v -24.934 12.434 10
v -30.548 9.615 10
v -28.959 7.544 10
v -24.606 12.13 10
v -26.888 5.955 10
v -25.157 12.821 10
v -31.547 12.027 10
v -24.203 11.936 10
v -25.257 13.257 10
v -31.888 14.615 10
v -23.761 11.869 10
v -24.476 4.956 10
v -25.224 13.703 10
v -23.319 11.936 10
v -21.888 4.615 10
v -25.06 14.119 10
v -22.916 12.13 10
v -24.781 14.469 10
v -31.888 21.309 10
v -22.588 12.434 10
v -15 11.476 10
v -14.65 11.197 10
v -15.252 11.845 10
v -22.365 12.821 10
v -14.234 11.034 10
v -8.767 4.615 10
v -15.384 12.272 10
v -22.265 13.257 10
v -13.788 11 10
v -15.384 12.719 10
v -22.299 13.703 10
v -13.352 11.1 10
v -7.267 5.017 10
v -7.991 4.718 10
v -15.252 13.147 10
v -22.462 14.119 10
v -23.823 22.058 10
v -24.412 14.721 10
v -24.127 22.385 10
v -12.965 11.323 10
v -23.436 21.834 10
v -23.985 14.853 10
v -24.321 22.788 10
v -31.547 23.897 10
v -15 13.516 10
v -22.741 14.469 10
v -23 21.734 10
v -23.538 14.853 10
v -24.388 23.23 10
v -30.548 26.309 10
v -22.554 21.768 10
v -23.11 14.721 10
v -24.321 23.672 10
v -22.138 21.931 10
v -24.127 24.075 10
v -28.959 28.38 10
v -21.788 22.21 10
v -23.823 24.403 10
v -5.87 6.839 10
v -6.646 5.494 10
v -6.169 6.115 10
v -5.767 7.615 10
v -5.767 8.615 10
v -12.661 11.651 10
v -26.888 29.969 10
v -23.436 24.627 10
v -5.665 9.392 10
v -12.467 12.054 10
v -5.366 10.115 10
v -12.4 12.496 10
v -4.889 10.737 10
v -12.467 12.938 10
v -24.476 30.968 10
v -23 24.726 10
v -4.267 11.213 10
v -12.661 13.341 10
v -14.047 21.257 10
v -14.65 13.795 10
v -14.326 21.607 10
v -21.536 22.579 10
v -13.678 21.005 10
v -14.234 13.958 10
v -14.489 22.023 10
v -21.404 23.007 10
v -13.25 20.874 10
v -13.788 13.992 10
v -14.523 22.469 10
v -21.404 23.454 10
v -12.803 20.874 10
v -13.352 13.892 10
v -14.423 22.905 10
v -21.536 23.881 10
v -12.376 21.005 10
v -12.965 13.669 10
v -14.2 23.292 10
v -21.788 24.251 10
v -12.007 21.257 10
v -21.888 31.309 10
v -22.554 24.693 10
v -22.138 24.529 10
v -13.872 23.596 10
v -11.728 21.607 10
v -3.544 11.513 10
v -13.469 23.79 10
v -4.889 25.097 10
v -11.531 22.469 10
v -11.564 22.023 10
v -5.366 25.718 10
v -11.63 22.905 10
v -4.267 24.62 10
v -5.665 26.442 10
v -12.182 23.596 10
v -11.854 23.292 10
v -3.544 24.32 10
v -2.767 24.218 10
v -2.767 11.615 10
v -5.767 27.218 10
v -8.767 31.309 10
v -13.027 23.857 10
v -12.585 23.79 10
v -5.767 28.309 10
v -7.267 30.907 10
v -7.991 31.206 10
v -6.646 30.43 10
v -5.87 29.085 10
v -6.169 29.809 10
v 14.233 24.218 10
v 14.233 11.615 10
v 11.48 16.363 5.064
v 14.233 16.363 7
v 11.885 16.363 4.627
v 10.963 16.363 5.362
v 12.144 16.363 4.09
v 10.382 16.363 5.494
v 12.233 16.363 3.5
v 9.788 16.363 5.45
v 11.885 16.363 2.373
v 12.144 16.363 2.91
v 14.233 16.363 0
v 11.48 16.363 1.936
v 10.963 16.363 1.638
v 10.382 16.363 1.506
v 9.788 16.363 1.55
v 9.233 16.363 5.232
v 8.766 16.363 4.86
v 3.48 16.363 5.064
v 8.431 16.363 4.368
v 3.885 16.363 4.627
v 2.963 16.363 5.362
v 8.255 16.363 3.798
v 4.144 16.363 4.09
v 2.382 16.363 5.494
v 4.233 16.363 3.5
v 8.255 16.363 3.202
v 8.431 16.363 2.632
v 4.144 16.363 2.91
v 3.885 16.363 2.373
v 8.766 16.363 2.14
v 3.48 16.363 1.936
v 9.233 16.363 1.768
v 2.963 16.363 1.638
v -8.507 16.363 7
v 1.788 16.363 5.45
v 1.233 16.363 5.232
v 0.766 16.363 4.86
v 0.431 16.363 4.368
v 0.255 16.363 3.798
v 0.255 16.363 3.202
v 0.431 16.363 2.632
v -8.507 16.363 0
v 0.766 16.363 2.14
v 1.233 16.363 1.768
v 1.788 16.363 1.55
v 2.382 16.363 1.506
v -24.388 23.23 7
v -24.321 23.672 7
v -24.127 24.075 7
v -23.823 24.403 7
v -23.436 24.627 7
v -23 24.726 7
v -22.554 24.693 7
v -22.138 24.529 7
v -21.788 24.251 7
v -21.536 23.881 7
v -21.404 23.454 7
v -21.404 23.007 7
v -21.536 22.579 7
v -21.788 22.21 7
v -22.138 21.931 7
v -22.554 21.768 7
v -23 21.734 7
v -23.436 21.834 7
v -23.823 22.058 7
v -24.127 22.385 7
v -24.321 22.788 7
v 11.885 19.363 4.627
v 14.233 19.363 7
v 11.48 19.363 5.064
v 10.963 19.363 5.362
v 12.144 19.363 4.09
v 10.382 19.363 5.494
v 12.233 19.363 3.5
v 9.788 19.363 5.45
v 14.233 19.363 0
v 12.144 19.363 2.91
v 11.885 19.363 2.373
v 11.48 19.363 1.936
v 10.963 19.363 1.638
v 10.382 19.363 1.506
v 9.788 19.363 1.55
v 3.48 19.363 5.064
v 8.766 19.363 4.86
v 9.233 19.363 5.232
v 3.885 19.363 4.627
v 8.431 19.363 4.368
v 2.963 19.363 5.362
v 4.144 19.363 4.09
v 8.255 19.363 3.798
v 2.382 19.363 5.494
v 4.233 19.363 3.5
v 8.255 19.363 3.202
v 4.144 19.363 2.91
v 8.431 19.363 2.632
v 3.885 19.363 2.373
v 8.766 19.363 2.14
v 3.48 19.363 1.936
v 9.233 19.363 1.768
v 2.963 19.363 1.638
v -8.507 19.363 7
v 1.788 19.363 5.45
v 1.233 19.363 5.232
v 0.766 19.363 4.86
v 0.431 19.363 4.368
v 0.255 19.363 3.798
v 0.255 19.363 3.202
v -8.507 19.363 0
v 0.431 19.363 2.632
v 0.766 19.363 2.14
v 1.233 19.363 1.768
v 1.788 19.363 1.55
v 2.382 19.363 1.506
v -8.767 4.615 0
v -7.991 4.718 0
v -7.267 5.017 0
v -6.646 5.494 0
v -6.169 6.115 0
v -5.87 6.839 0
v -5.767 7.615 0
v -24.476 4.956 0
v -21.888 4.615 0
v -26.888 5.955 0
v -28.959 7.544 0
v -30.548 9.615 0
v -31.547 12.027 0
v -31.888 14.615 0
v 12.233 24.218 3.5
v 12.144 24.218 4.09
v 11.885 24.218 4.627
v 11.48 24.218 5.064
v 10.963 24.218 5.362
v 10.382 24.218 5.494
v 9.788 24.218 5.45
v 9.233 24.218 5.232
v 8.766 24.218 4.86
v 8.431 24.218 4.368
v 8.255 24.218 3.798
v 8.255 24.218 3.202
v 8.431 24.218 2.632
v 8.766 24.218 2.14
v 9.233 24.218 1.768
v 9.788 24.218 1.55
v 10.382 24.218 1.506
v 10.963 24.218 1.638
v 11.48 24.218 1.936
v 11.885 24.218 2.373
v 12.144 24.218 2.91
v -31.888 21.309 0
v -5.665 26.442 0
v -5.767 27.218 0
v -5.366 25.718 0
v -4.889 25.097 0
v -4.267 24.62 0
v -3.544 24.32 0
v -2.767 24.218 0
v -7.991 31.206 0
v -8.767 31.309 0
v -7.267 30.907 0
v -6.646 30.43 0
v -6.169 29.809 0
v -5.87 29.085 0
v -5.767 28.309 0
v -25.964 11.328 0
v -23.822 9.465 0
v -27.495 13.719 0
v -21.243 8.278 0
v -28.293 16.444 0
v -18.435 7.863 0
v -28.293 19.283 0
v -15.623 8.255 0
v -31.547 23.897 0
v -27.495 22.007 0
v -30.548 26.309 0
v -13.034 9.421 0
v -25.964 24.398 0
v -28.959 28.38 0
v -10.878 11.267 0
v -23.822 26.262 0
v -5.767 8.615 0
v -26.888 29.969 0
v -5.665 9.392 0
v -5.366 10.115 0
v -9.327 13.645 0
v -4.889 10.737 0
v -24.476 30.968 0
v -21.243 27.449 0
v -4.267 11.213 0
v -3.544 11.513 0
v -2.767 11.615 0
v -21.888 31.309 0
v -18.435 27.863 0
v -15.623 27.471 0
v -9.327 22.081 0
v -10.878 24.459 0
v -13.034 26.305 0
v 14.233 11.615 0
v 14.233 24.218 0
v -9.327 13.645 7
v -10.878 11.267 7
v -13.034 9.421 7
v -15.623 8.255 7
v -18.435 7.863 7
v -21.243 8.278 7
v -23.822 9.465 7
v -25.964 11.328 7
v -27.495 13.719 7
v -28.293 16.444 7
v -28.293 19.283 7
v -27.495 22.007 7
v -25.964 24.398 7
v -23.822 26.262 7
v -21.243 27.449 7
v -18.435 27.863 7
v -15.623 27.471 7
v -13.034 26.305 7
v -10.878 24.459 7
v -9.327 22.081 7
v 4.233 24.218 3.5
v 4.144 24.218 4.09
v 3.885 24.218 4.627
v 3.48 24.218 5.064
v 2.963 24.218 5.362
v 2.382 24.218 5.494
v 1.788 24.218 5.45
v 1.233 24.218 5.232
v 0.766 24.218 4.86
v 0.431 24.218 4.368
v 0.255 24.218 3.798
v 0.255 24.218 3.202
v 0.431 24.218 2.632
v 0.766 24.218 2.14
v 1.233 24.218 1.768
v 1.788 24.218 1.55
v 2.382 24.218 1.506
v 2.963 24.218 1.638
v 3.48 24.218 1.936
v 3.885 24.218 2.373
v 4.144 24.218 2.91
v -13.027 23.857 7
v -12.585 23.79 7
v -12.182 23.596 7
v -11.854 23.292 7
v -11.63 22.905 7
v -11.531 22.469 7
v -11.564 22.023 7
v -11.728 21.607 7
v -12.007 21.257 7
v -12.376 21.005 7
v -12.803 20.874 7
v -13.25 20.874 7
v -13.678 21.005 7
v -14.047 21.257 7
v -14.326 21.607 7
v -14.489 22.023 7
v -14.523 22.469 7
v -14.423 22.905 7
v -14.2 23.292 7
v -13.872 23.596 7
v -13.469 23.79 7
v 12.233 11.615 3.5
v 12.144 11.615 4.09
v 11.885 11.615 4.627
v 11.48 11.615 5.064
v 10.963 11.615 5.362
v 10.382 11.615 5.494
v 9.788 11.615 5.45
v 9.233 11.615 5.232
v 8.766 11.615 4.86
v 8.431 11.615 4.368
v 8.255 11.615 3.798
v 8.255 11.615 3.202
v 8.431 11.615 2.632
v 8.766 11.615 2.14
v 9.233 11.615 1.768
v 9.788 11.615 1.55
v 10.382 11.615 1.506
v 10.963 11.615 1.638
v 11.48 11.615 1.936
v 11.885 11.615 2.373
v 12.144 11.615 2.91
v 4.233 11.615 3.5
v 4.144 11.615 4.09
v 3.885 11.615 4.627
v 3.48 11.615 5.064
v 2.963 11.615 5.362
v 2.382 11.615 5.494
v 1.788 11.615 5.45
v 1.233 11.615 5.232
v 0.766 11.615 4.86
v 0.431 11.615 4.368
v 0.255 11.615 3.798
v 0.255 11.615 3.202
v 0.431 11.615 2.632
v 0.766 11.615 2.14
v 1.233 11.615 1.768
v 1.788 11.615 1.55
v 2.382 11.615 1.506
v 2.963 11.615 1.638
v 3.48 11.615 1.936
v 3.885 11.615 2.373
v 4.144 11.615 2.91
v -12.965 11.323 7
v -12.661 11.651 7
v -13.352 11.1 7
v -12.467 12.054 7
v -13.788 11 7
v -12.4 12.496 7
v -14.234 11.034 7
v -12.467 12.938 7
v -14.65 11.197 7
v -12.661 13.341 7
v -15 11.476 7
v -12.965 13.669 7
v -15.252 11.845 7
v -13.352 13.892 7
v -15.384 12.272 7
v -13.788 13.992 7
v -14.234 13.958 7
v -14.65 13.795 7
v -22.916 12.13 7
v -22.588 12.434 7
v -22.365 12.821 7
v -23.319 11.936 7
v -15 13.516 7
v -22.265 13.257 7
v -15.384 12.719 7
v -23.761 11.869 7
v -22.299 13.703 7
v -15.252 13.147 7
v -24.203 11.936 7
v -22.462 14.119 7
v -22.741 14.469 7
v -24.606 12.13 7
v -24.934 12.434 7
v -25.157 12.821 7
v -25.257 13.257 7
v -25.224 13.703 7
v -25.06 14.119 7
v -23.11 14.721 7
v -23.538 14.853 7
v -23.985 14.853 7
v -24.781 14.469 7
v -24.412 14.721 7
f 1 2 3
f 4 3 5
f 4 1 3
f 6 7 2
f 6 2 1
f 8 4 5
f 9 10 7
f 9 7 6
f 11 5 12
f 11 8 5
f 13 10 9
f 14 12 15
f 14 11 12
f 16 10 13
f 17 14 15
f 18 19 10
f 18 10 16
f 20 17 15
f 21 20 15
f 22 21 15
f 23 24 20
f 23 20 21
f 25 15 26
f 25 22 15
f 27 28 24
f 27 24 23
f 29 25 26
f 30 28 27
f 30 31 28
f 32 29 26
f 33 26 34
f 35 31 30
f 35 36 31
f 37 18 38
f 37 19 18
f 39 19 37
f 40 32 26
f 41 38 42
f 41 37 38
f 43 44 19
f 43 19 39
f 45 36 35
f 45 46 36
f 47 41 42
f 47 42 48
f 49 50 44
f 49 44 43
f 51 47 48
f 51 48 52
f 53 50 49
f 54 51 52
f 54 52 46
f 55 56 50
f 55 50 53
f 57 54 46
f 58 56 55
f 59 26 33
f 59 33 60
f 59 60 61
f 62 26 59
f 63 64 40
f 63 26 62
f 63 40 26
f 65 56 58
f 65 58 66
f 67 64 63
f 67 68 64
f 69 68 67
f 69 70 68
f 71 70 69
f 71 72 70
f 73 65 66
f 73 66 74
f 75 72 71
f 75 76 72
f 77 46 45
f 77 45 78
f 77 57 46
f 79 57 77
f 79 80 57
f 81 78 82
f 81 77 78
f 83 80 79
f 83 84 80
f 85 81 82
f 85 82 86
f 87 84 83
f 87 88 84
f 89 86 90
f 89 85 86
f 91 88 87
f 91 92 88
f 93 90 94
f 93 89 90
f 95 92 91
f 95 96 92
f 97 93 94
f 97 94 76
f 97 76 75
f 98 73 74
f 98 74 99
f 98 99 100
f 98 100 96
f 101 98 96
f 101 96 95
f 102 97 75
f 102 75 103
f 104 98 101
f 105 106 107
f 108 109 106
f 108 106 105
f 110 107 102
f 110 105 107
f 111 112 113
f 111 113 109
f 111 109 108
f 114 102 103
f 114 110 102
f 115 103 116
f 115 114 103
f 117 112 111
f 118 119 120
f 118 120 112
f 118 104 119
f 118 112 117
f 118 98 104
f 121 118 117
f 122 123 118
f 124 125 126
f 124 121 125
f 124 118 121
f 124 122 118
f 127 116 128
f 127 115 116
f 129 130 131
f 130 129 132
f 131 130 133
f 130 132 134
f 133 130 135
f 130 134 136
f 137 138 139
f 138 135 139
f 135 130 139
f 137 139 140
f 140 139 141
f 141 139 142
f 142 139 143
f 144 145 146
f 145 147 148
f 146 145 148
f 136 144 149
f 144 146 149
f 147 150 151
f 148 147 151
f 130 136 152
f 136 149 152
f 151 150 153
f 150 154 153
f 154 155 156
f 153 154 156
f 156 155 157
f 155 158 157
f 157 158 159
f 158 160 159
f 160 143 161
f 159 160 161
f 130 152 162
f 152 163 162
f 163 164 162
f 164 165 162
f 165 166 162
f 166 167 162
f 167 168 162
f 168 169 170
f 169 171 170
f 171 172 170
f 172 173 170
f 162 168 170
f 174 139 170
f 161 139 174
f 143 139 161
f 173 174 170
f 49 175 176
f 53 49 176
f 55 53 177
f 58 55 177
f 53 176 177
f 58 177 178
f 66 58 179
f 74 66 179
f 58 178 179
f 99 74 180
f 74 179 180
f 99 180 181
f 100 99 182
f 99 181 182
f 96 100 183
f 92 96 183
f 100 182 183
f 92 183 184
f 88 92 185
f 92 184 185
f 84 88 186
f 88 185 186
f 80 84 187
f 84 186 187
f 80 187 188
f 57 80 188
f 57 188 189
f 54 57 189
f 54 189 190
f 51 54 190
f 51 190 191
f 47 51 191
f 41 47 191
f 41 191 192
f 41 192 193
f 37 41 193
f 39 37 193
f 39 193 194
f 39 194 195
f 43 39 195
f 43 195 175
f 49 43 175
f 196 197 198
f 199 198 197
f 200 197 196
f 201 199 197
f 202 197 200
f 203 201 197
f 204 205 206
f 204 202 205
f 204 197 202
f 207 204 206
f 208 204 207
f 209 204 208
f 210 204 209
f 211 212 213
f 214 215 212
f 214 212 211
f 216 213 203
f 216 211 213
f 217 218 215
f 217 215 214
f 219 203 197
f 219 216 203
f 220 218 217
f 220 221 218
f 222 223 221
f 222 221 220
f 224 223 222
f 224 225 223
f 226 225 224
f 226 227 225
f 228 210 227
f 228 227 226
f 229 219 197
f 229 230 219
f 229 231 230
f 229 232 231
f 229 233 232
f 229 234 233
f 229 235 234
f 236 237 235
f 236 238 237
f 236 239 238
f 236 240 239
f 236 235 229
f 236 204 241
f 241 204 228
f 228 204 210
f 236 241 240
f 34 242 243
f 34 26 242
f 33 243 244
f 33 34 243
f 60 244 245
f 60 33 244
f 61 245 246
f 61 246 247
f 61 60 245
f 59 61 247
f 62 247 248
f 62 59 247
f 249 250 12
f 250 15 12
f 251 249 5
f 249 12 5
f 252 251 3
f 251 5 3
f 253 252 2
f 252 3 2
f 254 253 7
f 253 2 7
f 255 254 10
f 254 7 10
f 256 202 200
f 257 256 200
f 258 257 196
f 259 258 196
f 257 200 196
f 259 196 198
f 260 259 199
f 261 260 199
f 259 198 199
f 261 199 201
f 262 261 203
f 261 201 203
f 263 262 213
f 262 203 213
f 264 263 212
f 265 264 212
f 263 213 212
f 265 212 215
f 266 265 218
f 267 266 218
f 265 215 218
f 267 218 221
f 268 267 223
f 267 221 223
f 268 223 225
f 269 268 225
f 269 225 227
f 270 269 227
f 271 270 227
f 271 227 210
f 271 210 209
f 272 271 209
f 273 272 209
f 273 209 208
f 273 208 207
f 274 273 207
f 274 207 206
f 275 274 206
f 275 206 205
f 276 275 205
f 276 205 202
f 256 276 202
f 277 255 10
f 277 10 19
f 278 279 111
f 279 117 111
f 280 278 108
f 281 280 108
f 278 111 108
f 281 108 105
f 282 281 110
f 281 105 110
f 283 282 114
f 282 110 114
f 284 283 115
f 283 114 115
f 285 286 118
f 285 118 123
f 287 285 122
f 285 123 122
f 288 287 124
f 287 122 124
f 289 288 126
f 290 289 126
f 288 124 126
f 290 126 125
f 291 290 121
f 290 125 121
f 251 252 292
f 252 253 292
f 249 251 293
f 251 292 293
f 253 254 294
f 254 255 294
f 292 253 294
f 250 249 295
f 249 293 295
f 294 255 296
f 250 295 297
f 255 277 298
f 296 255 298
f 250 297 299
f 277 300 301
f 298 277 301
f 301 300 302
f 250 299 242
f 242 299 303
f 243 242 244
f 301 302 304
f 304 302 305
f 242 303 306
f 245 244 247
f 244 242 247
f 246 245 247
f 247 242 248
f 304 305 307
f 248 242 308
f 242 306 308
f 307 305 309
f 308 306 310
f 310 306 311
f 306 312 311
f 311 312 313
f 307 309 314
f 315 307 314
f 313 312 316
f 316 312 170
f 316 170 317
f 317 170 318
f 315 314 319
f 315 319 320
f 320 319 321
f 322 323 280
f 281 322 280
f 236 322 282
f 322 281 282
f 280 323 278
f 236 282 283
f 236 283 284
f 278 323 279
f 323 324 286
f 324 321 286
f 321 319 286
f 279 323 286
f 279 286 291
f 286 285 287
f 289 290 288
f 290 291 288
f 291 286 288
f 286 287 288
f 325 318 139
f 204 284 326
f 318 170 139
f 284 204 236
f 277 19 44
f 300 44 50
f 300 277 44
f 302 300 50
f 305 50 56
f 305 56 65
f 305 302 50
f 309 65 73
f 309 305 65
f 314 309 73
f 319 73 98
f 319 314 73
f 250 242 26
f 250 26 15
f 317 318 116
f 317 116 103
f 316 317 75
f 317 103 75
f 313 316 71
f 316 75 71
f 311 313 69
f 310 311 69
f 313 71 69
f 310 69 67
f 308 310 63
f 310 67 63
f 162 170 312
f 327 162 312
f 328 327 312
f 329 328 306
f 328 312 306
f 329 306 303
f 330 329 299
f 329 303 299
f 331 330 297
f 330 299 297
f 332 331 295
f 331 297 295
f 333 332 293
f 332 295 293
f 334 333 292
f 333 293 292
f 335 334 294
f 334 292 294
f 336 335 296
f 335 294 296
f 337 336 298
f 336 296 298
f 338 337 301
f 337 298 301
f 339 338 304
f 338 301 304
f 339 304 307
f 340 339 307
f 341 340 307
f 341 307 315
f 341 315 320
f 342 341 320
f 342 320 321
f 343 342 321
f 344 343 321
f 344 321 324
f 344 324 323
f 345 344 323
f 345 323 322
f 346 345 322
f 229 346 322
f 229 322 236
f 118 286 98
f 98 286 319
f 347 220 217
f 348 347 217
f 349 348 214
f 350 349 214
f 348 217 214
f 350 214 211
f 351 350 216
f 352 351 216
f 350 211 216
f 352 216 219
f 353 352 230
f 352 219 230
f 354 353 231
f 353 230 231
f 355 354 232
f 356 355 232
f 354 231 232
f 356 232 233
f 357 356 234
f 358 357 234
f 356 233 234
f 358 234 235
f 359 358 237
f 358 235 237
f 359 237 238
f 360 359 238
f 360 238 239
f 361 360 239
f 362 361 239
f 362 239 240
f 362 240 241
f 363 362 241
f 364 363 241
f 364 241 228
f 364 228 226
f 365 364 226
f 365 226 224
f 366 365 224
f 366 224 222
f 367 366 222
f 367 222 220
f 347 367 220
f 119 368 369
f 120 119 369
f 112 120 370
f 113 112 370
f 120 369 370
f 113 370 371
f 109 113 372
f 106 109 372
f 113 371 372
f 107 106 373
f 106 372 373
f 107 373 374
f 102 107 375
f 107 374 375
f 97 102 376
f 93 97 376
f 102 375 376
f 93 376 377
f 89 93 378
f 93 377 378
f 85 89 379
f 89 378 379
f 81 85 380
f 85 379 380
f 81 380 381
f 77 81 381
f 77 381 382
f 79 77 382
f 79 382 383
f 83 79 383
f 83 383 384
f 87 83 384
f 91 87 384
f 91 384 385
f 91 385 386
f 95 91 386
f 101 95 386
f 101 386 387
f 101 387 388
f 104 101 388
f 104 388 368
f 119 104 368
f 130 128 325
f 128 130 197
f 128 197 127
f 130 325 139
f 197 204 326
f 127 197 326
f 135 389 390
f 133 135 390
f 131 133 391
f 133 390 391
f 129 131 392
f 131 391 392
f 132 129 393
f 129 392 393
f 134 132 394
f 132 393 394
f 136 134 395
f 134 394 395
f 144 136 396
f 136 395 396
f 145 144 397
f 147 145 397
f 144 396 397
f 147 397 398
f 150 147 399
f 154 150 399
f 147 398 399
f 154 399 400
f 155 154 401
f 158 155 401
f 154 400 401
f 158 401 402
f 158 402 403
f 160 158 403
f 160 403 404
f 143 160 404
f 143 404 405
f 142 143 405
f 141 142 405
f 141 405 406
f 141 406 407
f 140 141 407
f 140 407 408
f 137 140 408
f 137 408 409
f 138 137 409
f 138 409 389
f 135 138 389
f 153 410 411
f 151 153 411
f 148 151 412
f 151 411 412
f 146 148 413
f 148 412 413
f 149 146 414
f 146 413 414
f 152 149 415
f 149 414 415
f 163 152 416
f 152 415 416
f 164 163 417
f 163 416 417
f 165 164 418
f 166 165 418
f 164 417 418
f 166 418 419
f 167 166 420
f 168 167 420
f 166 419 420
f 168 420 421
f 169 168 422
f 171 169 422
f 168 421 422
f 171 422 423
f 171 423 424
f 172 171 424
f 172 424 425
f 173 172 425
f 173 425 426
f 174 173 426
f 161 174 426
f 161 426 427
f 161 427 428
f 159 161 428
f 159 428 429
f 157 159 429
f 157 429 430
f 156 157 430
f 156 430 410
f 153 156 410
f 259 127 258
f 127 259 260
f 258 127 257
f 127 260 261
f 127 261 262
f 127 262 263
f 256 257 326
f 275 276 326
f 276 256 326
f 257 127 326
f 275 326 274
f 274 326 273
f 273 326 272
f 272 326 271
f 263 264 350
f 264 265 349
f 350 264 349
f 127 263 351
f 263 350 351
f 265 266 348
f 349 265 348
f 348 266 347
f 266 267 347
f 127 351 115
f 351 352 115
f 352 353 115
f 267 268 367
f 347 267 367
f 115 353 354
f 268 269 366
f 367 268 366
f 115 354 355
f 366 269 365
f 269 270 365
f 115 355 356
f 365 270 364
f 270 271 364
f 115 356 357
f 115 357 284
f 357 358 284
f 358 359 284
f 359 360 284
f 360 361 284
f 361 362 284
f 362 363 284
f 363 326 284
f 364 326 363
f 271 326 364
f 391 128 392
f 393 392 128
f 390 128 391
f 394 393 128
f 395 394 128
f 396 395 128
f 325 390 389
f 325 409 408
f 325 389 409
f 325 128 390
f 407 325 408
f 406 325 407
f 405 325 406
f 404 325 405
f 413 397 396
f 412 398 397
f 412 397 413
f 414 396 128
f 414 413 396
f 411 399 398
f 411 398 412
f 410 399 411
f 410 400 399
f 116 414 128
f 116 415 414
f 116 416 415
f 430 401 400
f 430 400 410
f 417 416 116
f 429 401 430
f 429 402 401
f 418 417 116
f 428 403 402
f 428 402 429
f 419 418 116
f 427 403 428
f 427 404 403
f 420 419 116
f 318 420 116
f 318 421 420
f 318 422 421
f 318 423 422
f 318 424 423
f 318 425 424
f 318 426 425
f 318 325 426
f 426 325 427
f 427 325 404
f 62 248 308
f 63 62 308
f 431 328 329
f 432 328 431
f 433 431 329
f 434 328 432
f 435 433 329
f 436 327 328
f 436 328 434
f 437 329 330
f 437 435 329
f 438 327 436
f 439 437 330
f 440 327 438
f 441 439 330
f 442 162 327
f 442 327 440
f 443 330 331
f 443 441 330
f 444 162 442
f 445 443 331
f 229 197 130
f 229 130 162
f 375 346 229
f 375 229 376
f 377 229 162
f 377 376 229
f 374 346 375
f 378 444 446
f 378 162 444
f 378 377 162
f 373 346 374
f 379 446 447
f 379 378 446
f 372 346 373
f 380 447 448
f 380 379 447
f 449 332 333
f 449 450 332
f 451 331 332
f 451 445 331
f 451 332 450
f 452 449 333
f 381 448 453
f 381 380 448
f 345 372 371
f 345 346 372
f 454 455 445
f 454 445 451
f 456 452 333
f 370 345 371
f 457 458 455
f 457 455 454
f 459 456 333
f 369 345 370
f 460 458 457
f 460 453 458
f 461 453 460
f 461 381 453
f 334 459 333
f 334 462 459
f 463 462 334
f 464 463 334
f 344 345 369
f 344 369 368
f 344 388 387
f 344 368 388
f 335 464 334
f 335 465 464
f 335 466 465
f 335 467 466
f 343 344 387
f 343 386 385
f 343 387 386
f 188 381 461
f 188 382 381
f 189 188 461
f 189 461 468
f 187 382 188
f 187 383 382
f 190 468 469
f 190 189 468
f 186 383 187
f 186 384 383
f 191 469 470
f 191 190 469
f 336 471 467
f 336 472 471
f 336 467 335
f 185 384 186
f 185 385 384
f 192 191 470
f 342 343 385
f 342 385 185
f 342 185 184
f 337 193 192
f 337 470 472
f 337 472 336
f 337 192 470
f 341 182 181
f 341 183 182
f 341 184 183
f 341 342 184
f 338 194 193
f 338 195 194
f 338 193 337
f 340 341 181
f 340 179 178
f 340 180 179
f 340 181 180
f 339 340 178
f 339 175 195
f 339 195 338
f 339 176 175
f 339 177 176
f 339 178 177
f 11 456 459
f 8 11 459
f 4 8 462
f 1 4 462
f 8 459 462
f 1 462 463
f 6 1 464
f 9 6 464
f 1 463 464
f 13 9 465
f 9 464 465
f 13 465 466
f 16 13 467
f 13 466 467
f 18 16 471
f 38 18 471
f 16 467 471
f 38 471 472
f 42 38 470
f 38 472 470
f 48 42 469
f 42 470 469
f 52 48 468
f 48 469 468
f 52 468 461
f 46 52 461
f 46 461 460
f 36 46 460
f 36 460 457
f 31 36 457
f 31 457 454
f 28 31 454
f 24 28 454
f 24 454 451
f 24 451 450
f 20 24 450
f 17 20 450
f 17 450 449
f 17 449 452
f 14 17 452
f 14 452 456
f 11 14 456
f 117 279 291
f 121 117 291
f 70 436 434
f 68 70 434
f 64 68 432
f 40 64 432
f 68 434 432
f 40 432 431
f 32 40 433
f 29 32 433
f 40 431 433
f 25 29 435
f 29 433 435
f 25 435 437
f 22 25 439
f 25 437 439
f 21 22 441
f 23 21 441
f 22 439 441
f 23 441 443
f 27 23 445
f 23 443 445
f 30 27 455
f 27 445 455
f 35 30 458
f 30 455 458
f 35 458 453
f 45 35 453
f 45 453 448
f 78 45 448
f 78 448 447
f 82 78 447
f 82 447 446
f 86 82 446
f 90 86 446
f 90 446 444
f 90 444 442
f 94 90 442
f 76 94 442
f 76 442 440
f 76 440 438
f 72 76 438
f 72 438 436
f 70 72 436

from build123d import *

# Parameters (mm, degrees)
ESQUISSE1_R                  = 50
BOSS_EXTRU_1_DEPTH           = 10
ESQUISSE2_R                  = 10
ENL_V_MAT_EXTRU_1_DEPTH      = 7
ESQUISSE4_W                  = 52.254082237
ESQUISSE4_H                  = 3
ENL_V_MAT_EXTRU_2_DEPTH      = 7
ESQUISSE6_W                  = 109.070687356
ESQUISSE6_H                  = 40.053485354
ENL_V_MAT_EXTRU_3_DEPTH      = 10
ESQUISSE8_W                  = 43.455454537
ESQUISSE8_H                  = 73.019440826
ENL_V_MAT_EXTRU_4_DEPTH      = 10
ESQUISSE9_W                  = 83.209839814
ESQUISSE9_H                  = 41.336413251
ENL_V_MAT_EXTRU_5_DEPTH      = 10
ESQUISSE10_W                 = 31.997575123
ESQUISSE10_H                 = 50.623415865
ENL_V_MAT_EXTRU_6_DEPTH      = 10
ESQUISSE11_R                 = 1.5
ENL_V_MAT_EXTRU_7_DEPTH      = 10
CONG_1_R                     = 10
ESQUISSE16_W                 = 20
ESQUISSE16_H                 = 7
ENL_V_MAT_EXTRU_11_DEPTH     = 10
CONG_2_R                     = 3
R_P_TITION_CIRCULAIRE1_COUNT = 4
ESQUISSE17_W                 = 20
ESQUISSE17_H                 = 7.090454939
ENL_V_MAT_EXTRU_12_DEPTH     = 10
CONG_3_R                     = 3
ESQUISSE19_R                 = 2
ENL_V_MAT_EXTRU_13_DEPTH     = 20
ESQUISSE19_3_R               = 2
ENL_V_MAT_EXTRU_14_DEPTH     = 20


with BuildPart() as part:
    # Esquisse1 → Boss.-Extru.1 (new body)
    with BuildSketch(Plane.XY):
        with Locations((-18.393953774, 17.863079719)):
            Circle(ESQUISSE1_R)
    extrude(amount=BOSS_EXTRU_1_DEPTH)

    # Esquisse2 → Enl_v. mat.-Extru.1 (cut)
    with BuildSketch(Plane(origin=(0, 0, 0), x_dir=(-1, 0, 0), z_dir=(0, 0, -1))):
        with Locations((18.393953774, 17.863079719)):
            Circle(ESQUISSE2_R)
    extrude(amount=-ENL_V_MAT_EXTRU_1_DEPTH, mode=Mode.SUBTRACT)

    # Esquisse4 → Enl_v. mat.-Extru.2 (cut)
    with BuildSketch(Plane(origin=(0, 0, 0), x_dir=(-1, 0, 0), z_dir=(0, 0, -1))):
        with Locations((-12.461439017, 17.863079719)):
            Rectangle(ESQUISSE4_W, ESQUISSE4_H)
    extrude(amount=-ENL_V_MAT_EXTRU_2_DEPTH, mode=Mode.SUBTRACT)

    # Esquisse6 → Enl_v. mat.-Extru.3 (cut)
    with BuildSketch(Plane(origin=(0, 0, 0), x_dir=(-1, 0, 0), z_dir=(0, 0, -1))):
        with Locations((22.721030159, 51.335342826)):
            Rectangle(ESQUISSE6_W, ESQUISSE6_H)
    extrude(amount=-ENL_V_MAT_EXTRU_3_DEPTH, mode=Mode.SUBTRACT)

    # Esquisse8 → Enl_v. mat.-Extru.4 (cut)
    with BuildSketch(Plane(origin=(0, 0, 0), x_dir=(-1, 0, 0), z_dir=(0, 0, -1))):
        with Locations((53.615379414, 4.486243449)):
            Rectangle(ESQUISSE8_W, ESQUISSE8_H)
    extrude(amount=-ENL_V_MAT_EXTRU_4_DEPTH, mode=Mode.SUBTRACT)

    # Esquisse9 → Enl_v. mat.-Extru.5 (cut)
    with BuildSketch(Plane(origin=(0, 0, 0), x_dir=(-1, 0, 0), z_dir=(0, 0, -1))):
        with Locations((0.000153838, -16.052922386)):
            Rectangle(ESQUISSE9_W, ESQUISSE9_H)
    extrude(amount=-ENL_V_MAT_EXTRU_5_DEPTH, mode=Mode.SUBTRACT)

    # Esquisse10 → Enl_v. mat.-Extru.6 (cut)
    with BuildSketch(Plane(origin=(0, 0, 0), x_dir=(-1, 0, 0), z_dir=(0, 0, -1))):
        with Locations((-30.231359533, 14.74109753)):
            Rectangle(ESQUISSE10_W, ESQUISSE10_H)
    extrude(amount=-ENL_V_MAT_EXTRU_6_DEPTH, mode=Mode.SUBTRACT)

    # Esquisse11 → Enl_v. mat.-Extru.7 (cut)
    with BuildSketch(Plane(origin=(0, 0, 7), x_dir=(-1, 0, 0), z_dir=(0, 0, -1))):
        with Locations((22.887652145, 23.230264731)):
            Circle(ESQUISSE11_R)
    enl_v_mat_extru_7 = extrude(amount=-ENL_V_MAT_EXTRU_7_DEPTH, mode=Mode.SUBTRACT)

    # Cong_1
    cong_1_edges = [part.edges().sort_by_distance(p)[0] for p in [
        (-31.887652145, 31.308600149, 5),
        (-31.887652145, 4.61528424, 5),
    ]]
    fillet(cong_1_edges, radius=CONG_1_R)

    # Esquisse16 → Enl_v. mat.-Extru.11 (cut)
    with BuildSketch(Plane(origin=(0, 0, 0), x_dir=(-1, 0, 0), z_dir=(0, 0, -1))):
        with Locations((-4.232571971, 8.11528424)):
            Rectangle(ESQUISSE16_W, ESQUISSE16_H)
    extrude(amount=-ENL_V_MAT_EXTRU_11_DEPTH, mode=Mode.SUBTRACT)

    # Cong_2
    cong_2_edges = [part.edges().sort_by_distance(p)[0] for p in [
        (-5.767428029, 4.61528424, 5),
        (-5.767428029, 11.61528424, 5),
    ]]
    fillet(cong_2_edges, radius=CONG_2_R)

    # R_p_tition circulaire1: Enl_v. mat.-Extru.7 ×4 about axis
    r_p_tition_circulaire1_axis = Axis((-18.393953774, 17.863079719, 7), (0, 0, -1))
    for i in range(1, R_P_TITION_CIRCULAIRE1_COUNT):
        add(enl_v_mat_extru_7.rotate(r_p_tition_circulaire1_axis, i * 360 / R_P_TITION_CIRCULAIRE1_COUNT), mode=Mode.SUBTRACT)

    # Esquisse17 → Enl_v. mat.-Extru.12 (cut)
    with BuildSketch(Plane(origin=(0, 0, 0), x_dir=(-1, 0, 0), z_dir=(0, 0, -1))):
        with Locations((-4.232571971, 27.76337268)):
            Rectangle(ESQUISSE17_W, ESQUISSE17_H)
    extrude(amount=-ENL_V_MAT_EXTRU_12_DEPTH, mode=Mode.SUBTRACT)

    # Cong_3
    cong_3_edges = [part.edges().sort_by_distance(p)[0] for p in [
        (-5.767428029, 24.21814521, 5),
        (-5.767428029, 31.308600149, 5),
    ]]
    fillet(cong_3_edges, radius=CONG_3_R)

    # Esquisse19 → Enl_v. mat.-Extru.13 (cut)
    with BuildSketch(Plane.XZ.offset(-11.61528424)):
        with Locations((10.232571971, 3.5)):
            Circle(ESQUISSE19_R)
    extrude(amount=-ENL_V_MAT_EXTRU_13_DEPTH, mode=Mode.SUBTRACT)

    # Esquisse19_3 → Enl_v. mat.-Extru.14 (cut)
    with BuildSketch(Plane.XZ.offset(-11.61528424)):
        with Locations((10.232571971, 3.5)):
            Circle(ESQUISSE19_3_R)
        with Locations((2.232571971, 3.5)):
            Circle(ESQUISSE19_3_R)
    extrude(amount=-ENL_V_MAT_EXTRU_14_DEPTH, mode=Mode.SUBTRACT)


solid = part.part
